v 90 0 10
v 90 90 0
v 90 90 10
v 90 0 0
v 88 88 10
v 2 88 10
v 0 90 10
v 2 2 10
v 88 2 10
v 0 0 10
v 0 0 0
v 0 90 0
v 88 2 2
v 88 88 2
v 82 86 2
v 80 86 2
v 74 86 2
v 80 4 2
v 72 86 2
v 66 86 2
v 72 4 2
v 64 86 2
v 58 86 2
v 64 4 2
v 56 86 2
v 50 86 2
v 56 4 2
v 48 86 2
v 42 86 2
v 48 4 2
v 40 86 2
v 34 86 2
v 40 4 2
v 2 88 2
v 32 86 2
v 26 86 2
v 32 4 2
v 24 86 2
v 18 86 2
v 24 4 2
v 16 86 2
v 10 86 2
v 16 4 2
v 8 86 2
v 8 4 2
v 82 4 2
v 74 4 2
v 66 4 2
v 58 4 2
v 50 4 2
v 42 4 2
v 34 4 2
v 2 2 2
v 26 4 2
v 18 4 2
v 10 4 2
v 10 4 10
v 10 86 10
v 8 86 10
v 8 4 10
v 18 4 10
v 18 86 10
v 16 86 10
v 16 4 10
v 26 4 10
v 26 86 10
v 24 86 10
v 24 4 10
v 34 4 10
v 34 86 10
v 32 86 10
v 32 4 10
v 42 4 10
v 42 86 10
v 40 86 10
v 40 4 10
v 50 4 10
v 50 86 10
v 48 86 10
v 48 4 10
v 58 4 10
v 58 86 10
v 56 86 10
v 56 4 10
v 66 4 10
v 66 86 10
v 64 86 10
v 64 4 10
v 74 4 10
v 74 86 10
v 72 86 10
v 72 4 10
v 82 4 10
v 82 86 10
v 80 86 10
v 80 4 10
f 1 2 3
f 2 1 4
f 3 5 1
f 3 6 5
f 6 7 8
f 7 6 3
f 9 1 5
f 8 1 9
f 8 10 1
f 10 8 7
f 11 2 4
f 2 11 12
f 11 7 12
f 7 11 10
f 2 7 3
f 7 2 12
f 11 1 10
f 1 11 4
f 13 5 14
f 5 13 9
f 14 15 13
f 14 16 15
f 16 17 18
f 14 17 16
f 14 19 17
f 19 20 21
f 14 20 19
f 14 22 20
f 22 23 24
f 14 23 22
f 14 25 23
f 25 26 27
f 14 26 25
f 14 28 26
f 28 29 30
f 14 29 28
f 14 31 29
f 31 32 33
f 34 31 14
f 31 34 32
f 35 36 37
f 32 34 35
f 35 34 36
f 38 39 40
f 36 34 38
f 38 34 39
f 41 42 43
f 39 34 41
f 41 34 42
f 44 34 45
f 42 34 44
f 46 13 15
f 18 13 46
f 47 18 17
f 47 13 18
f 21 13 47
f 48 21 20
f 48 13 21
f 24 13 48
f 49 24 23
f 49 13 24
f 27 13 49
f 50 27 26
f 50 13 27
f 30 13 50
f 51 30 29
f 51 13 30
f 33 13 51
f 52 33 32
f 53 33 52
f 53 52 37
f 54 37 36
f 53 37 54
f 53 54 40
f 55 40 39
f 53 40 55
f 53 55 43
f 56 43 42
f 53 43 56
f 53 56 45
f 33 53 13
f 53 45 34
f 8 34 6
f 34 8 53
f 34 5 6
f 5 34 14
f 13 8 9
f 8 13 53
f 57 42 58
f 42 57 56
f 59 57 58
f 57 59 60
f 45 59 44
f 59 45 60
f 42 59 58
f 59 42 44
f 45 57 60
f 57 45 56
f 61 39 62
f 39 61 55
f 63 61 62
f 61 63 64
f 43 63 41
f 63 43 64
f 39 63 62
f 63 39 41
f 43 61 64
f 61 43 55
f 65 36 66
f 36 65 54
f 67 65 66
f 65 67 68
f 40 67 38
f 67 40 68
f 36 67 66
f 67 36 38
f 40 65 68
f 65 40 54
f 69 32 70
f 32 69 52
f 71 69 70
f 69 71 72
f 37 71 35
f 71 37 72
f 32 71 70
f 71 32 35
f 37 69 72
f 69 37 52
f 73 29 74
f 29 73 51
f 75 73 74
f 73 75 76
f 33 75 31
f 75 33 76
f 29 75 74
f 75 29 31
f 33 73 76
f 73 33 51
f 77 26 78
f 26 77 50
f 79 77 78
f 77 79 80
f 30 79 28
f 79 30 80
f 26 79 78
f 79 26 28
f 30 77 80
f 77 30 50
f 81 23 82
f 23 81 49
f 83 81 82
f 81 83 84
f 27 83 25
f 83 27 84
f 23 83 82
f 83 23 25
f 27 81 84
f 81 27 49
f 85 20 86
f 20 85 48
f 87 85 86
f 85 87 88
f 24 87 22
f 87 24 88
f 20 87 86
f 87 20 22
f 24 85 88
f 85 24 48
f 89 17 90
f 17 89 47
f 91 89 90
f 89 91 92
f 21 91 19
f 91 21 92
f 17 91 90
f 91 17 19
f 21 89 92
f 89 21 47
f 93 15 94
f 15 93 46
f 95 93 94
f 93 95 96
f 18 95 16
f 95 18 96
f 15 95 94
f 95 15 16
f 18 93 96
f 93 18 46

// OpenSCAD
// this is the x/y size of the tray
width = 90;
// how deep the tray is
depth = 10;
//how far apart the "fins" should be
spacing = 6;
// how thick the walls/floor should be
wall_width = 2;
module plantTray(){
    difference() {
        cube([width,width,depth]);
        translate([wall_width,wall_width,wall_width])
            cube([width-2*wall_width,width-2*wall_width,depth]);
    }
    for (i = [1:(width-2*wall_width)/(spacing+wall_width)]) {
        translate([i * (spacing+wall_width), 2*wall_width, 0]) 
            cube([wall_width, width-4*wall_width,depth]);
    }
}
plantTray();
